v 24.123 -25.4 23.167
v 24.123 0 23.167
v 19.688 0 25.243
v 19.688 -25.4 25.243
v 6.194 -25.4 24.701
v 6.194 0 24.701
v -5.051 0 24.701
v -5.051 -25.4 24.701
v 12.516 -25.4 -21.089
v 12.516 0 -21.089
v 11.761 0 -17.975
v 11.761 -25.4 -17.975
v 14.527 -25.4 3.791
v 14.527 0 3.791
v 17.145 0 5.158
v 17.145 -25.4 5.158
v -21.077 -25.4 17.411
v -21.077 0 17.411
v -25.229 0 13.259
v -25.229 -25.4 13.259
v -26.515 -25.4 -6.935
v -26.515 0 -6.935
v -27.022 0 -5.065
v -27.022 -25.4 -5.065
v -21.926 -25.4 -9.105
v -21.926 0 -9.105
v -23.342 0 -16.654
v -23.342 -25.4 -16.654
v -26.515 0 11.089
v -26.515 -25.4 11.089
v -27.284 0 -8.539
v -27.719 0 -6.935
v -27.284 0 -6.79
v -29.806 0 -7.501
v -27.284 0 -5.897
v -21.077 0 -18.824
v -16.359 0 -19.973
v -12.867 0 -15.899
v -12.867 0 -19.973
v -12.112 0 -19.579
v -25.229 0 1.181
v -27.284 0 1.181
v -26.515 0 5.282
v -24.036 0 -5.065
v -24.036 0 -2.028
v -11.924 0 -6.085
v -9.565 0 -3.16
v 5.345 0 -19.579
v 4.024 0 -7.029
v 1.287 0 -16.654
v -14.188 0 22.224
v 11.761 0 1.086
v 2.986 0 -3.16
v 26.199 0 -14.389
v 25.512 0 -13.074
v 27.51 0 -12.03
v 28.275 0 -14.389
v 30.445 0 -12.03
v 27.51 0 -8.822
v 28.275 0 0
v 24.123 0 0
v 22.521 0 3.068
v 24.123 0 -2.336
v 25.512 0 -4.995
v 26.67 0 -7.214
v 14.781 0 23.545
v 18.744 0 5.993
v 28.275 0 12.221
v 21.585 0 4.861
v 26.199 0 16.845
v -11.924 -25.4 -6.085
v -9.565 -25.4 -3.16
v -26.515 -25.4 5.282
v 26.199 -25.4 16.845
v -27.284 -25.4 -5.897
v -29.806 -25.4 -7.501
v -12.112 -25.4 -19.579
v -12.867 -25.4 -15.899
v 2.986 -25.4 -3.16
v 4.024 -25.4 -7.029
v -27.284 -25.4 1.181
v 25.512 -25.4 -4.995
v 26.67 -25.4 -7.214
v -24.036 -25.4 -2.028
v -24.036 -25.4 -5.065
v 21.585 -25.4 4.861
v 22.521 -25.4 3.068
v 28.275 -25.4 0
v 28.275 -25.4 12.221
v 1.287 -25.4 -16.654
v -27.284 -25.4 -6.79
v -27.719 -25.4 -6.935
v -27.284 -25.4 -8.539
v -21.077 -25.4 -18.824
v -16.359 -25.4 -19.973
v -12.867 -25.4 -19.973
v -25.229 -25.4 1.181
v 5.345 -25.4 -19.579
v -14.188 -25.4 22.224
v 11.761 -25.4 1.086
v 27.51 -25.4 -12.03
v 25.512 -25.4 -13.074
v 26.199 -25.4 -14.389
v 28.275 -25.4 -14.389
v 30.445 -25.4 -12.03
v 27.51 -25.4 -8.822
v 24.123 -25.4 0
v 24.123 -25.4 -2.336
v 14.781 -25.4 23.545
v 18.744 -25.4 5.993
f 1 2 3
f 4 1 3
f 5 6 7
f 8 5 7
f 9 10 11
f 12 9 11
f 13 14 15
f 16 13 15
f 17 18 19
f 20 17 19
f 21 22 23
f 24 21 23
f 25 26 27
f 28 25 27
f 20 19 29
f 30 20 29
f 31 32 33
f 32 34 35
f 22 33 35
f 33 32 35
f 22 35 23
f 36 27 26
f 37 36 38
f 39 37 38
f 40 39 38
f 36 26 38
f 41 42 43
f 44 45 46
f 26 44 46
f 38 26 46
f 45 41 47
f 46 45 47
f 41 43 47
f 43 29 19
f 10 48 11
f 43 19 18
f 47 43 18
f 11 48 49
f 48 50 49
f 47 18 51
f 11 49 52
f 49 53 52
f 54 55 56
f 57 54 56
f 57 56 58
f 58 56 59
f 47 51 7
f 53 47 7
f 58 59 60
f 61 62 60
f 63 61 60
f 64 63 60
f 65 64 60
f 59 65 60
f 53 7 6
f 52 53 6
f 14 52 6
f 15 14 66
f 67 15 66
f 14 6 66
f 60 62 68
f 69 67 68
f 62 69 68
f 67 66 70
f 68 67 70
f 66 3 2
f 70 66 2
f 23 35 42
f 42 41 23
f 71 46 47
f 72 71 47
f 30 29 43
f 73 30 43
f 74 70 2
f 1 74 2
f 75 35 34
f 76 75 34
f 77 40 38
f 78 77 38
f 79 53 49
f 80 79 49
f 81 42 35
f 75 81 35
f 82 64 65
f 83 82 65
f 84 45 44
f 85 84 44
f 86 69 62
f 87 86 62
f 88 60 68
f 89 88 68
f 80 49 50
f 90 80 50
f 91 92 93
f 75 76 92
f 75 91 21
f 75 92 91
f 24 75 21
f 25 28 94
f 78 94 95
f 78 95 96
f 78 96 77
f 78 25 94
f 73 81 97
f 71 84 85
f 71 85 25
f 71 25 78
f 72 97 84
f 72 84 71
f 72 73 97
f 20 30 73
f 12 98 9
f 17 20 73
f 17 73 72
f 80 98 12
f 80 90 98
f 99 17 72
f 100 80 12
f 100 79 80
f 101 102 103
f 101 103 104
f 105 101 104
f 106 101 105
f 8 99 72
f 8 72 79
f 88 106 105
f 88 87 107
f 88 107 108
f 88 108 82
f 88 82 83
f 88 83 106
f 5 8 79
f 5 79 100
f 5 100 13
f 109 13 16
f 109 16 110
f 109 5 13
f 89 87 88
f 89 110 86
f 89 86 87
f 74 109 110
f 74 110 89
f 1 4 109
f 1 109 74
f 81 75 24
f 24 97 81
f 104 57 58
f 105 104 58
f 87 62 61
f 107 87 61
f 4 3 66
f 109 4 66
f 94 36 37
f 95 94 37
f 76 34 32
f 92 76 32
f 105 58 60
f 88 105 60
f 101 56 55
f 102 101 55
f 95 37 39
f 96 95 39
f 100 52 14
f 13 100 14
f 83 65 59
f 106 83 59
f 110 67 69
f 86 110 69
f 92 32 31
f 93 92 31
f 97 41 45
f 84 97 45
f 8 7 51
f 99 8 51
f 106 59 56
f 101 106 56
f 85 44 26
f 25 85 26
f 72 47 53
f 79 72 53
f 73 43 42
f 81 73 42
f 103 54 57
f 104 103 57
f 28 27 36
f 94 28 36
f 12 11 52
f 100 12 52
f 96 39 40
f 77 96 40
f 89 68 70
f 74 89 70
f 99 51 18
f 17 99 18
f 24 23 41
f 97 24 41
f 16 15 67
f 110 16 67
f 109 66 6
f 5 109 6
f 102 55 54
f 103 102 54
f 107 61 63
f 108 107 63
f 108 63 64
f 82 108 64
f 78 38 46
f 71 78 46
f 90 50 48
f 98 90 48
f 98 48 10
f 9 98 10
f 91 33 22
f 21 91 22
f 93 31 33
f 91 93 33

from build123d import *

# Parameters (mm, degrees)
F1_DEPTH = 25.4


with BuildPart() as f1:
    # F0 (on Front) → F1 (new body)
    with BuildSketch(Plane.XZ):
        Polygon((19.687949, 25.243243), (14.781063, 23.544706), (6.194014, 24.701377), (-5.051399, 24.701377), (-14.188432, 22.223622), (-21.076944, 17.4111), (-25.228923, 13.259119), (-26.514801, 11.088767), (-26.514801, 5.281893), (-27.283788, 1.180633), (-27.283788, -5.896606), (-29.806441, -7.50078), (-27.718788, -6.934656), (-27.283788, -8.538775), (-27.283788, -6.790471), (-26.514801, -6.934656), (-27.021825, -5.06494), (-25.228923, 1.180633), (-24.035911, -2.027715), (-24.035911, -5.06494), (-21.926213, -9.104954), (-23.341661, -16.654009), (-21.076944, -18.824359), (-16.358785, -19.973479), (-12.867347, -19.973479), (-12.112442, -19.579267), (-12.867347, -15.899101), (-11.923715, -6.085332), (-9.564636, -3.160073), (2.985667, -3.160073), (4.023661, -7.028964), (1.287129, -16.654009), (5.344746, -19.579267), (12.516348, -21.089077), (11.761442, -17.975092), (11.761442, -16.654009), (11.761442, 1.08627), (14.527172, 3.790959), (17.145273, 5.158133), (18.744318, 5.993155), (21.584706, 4.860796), (22.52096, 3.067896), (24.123017, 0), (24.123017, -2.335592), (25.511982, -4.995424), (26.670383, -7.213729), (27.510151, -8.821864), (27.510151, -12.030212), (25.511982, -13.073657), (26.199007, -14.389291), (28.275, -14.389291), (30.445352, -12.030212), (28.275, 0), (28.275, 1.841175), (28.275, 4.860796), (28.275, 12.221124), (26.199007, 16.844919), (24.123017, 23.167253), align=None)
    extrude(amount=F1_DEPTH)


solid = f1.part
